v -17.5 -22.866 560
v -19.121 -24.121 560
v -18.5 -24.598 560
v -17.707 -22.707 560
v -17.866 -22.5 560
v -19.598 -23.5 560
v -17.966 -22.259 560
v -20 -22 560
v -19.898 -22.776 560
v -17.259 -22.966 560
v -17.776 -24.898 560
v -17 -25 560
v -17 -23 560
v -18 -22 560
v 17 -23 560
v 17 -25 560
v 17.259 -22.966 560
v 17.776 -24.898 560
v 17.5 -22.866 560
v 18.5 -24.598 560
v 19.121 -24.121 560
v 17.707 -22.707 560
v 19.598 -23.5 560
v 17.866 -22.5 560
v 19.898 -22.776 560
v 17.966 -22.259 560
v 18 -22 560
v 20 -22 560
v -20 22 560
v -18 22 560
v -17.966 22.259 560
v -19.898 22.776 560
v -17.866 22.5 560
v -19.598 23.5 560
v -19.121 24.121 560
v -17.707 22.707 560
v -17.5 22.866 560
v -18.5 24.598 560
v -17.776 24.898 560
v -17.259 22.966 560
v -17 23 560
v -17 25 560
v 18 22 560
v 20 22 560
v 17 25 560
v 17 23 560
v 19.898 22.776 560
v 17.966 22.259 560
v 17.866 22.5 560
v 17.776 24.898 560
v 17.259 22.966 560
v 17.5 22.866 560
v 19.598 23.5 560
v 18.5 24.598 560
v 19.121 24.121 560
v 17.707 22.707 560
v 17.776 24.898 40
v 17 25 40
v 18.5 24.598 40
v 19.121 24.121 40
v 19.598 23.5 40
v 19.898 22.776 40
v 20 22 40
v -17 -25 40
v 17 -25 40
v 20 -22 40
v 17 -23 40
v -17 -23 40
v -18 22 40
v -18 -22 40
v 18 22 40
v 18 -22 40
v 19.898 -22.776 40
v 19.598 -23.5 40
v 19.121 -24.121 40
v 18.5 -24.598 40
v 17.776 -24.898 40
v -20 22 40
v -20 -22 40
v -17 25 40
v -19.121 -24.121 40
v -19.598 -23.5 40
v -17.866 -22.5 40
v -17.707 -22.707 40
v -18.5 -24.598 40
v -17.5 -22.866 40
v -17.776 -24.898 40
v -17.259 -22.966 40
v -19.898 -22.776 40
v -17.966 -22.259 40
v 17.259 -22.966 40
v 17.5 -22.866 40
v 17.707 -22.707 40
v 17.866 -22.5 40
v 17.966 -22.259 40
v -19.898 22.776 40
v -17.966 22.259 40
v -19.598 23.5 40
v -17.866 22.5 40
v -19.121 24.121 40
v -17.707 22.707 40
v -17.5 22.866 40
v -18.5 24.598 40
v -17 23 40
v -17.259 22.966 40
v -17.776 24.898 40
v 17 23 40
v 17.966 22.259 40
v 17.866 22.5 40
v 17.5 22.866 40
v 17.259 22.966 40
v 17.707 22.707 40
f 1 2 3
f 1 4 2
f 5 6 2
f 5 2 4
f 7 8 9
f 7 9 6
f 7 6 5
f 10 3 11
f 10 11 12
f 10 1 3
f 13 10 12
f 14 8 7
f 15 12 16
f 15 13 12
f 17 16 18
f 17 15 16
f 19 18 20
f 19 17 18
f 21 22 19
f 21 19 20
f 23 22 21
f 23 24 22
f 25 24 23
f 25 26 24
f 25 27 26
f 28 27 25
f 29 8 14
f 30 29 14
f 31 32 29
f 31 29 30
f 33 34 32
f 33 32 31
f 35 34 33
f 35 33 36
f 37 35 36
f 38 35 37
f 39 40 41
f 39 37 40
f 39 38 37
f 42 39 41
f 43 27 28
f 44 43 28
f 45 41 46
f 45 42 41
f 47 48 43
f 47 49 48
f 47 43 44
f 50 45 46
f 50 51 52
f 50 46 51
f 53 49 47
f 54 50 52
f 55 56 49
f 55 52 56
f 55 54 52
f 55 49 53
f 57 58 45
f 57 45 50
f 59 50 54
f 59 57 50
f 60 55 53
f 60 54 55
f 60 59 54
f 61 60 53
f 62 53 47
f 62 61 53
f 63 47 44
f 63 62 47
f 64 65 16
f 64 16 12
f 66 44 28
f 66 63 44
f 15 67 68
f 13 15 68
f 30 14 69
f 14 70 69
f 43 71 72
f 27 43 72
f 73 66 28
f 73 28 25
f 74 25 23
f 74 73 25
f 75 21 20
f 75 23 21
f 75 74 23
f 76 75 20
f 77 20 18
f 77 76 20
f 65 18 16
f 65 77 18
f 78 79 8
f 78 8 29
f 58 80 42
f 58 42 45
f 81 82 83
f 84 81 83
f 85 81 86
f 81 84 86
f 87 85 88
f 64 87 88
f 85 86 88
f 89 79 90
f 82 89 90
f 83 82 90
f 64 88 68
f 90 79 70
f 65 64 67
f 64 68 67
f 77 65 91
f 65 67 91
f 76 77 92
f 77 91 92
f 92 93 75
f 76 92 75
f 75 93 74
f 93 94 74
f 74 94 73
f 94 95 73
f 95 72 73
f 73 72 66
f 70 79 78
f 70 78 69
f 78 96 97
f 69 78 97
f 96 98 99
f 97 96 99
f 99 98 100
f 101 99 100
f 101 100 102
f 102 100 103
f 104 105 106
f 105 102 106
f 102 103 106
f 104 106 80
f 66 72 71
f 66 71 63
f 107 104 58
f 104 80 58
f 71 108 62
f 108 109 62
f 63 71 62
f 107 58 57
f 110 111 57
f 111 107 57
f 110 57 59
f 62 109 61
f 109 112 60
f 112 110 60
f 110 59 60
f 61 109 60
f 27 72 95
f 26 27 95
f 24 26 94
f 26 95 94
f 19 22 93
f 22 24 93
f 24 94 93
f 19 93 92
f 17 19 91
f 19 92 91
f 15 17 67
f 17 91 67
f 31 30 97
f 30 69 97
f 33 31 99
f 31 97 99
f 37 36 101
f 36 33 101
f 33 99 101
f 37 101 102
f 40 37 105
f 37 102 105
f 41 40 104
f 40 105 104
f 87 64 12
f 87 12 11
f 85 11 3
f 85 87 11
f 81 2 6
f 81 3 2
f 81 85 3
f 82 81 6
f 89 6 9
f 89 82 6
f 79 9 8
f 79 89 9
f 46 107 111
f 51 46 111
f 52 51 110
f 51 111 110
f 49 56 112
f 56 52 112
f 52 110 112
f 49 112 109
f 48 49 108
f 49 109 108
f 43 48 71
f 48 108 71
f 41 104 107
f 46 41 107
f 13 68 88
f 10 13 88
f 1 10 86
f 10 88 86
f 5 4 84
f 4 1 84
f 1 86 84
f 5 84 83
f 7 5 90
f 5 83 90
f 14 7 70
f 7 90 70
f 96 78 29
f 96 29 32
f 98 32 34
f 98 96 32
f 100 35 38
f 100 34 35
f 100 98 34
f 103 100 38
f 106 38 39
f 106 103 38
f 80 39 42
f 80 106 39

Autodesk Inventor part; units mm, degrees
ref_plane "Start plane" through (0, 0, 40) normal (0, 0, 1) x (1, 0, 0)
ref_plane "End plane" through (0, 0, 560) normal (0, 0, 1) x (1, 0, 0)
sketch "Sketch" plane through (0, 0, 0) normal (0, 0, 1) x (1, 0, 0)
  line L0 (-20, -22) -> (-20, 22)
  line L1 (-17, 25) -> (17, 25)
  line L2 (20, 22) -> (20, -22)
  line L3 (17, -25) -> (-17, -25)
  arc A0 (-20, -22) -> (-17, -25) centre (-17, -22) ccw
  arc A1 (-17, 25) -> (-20, 22) centre (-17, 22) ccw
  arc A2 (20, 22) -> (17, 25) centre (17, 22) ccw
  arc A3 (17, -25) -> (20, -22) centre (17, -22) ccw
  arc A4 (-17, 23) -> (-18, 22) centre (-17, 22) ccw
  line L4 (-17, 23) -> (17, 23)
  arc A5 (18, 22) -> (17, 23) centre (17, 22) ccw
  line L5 (18, 22) -> (18, -22)
  arc A6 (17, -23) -> (18, -22) centre (17, -22) ccw
  line L6 (17, -23) -> (-17, -23)
  arc A7 (-18, -22) -> (-17, -23) centre (-17, -22) ccw
  line L7 (-18, -22) -> (-18, 22)
  line L8 (0, 35.8698) -> (0, -35.8698) construction
  line L9 (-28.8698, 0) -> (28.8698, 0) construction
  dimension "d7" = 3
  dimension "d10" = 50
  dimension "d11" = 40
  dimension "d12" = 2
  dimension "d15" = 25
  dimension "d16" = 20
extrude "Body" add sketch "Sketch" along normal up to surface (520 mm away) from surface at 40
sketch "Sketch3" plane through (0, 0, 0) normal (0, 0, 1) x (1, 0, 0)
  line L0 (0, 0) -> (10, 0)
ref_plane "Work Plane3" through (0, 0, 0) normal (0, -1, 0) x (1, 0, 0)
sketch "Sketch4" plane through (0, 0, 0) normal (0, -1, 0) x (1, 0, 0)
  line L0 (-2, 40) -> (12, 40)
  line L1 (-2, 560) -> (12, 560)
  dimension "d18" = 520
ref_plane "Work Plane4" through (-27, -475, 560) normal (0, 0, 1) x (1, 0, 0)
split "Split1" plane through (-27, -475, 560) removes the side toward (0, 0, 1)
ref_plane "Work Plane5" through (-390, -22, 40) normal (0, 0, -1) x (-1, 0, 0)
split "Split2" plane through (-390, -22, 40) removes the side toward (0, 0, -1)
equation "\"d7\" = G_IR"
equation "\"d10\" = G_H"
equation "\"d11\" = G_W"
equation "\"d12\" = G_T"
equation "\"d15\" = 0.5 * d10"
equation "\"d16\" = 0.5 * d11"
equation "\"d3\" = G_L"
equation "\"G_W\" = 40"
equation "\"G_H\" = 50"
equation "\"G_T\" = 2"
equation "\"G_IR\" = 3"
equation "\"G_L\" = d18"
equation "\"G_OFFSET_START\" = -40"
equation "\"G_OFFSET_END\" = -40"
equation "\"d13\" = -G_OFFSET_START"
equation "\"d14\" = G_OFFSET_END + B_L"
equation "\"B_L\" = 600"
properties part number "UNI EN 10305-5 - 50 x 40 x 2  - 520" material "Steel, Mild"
